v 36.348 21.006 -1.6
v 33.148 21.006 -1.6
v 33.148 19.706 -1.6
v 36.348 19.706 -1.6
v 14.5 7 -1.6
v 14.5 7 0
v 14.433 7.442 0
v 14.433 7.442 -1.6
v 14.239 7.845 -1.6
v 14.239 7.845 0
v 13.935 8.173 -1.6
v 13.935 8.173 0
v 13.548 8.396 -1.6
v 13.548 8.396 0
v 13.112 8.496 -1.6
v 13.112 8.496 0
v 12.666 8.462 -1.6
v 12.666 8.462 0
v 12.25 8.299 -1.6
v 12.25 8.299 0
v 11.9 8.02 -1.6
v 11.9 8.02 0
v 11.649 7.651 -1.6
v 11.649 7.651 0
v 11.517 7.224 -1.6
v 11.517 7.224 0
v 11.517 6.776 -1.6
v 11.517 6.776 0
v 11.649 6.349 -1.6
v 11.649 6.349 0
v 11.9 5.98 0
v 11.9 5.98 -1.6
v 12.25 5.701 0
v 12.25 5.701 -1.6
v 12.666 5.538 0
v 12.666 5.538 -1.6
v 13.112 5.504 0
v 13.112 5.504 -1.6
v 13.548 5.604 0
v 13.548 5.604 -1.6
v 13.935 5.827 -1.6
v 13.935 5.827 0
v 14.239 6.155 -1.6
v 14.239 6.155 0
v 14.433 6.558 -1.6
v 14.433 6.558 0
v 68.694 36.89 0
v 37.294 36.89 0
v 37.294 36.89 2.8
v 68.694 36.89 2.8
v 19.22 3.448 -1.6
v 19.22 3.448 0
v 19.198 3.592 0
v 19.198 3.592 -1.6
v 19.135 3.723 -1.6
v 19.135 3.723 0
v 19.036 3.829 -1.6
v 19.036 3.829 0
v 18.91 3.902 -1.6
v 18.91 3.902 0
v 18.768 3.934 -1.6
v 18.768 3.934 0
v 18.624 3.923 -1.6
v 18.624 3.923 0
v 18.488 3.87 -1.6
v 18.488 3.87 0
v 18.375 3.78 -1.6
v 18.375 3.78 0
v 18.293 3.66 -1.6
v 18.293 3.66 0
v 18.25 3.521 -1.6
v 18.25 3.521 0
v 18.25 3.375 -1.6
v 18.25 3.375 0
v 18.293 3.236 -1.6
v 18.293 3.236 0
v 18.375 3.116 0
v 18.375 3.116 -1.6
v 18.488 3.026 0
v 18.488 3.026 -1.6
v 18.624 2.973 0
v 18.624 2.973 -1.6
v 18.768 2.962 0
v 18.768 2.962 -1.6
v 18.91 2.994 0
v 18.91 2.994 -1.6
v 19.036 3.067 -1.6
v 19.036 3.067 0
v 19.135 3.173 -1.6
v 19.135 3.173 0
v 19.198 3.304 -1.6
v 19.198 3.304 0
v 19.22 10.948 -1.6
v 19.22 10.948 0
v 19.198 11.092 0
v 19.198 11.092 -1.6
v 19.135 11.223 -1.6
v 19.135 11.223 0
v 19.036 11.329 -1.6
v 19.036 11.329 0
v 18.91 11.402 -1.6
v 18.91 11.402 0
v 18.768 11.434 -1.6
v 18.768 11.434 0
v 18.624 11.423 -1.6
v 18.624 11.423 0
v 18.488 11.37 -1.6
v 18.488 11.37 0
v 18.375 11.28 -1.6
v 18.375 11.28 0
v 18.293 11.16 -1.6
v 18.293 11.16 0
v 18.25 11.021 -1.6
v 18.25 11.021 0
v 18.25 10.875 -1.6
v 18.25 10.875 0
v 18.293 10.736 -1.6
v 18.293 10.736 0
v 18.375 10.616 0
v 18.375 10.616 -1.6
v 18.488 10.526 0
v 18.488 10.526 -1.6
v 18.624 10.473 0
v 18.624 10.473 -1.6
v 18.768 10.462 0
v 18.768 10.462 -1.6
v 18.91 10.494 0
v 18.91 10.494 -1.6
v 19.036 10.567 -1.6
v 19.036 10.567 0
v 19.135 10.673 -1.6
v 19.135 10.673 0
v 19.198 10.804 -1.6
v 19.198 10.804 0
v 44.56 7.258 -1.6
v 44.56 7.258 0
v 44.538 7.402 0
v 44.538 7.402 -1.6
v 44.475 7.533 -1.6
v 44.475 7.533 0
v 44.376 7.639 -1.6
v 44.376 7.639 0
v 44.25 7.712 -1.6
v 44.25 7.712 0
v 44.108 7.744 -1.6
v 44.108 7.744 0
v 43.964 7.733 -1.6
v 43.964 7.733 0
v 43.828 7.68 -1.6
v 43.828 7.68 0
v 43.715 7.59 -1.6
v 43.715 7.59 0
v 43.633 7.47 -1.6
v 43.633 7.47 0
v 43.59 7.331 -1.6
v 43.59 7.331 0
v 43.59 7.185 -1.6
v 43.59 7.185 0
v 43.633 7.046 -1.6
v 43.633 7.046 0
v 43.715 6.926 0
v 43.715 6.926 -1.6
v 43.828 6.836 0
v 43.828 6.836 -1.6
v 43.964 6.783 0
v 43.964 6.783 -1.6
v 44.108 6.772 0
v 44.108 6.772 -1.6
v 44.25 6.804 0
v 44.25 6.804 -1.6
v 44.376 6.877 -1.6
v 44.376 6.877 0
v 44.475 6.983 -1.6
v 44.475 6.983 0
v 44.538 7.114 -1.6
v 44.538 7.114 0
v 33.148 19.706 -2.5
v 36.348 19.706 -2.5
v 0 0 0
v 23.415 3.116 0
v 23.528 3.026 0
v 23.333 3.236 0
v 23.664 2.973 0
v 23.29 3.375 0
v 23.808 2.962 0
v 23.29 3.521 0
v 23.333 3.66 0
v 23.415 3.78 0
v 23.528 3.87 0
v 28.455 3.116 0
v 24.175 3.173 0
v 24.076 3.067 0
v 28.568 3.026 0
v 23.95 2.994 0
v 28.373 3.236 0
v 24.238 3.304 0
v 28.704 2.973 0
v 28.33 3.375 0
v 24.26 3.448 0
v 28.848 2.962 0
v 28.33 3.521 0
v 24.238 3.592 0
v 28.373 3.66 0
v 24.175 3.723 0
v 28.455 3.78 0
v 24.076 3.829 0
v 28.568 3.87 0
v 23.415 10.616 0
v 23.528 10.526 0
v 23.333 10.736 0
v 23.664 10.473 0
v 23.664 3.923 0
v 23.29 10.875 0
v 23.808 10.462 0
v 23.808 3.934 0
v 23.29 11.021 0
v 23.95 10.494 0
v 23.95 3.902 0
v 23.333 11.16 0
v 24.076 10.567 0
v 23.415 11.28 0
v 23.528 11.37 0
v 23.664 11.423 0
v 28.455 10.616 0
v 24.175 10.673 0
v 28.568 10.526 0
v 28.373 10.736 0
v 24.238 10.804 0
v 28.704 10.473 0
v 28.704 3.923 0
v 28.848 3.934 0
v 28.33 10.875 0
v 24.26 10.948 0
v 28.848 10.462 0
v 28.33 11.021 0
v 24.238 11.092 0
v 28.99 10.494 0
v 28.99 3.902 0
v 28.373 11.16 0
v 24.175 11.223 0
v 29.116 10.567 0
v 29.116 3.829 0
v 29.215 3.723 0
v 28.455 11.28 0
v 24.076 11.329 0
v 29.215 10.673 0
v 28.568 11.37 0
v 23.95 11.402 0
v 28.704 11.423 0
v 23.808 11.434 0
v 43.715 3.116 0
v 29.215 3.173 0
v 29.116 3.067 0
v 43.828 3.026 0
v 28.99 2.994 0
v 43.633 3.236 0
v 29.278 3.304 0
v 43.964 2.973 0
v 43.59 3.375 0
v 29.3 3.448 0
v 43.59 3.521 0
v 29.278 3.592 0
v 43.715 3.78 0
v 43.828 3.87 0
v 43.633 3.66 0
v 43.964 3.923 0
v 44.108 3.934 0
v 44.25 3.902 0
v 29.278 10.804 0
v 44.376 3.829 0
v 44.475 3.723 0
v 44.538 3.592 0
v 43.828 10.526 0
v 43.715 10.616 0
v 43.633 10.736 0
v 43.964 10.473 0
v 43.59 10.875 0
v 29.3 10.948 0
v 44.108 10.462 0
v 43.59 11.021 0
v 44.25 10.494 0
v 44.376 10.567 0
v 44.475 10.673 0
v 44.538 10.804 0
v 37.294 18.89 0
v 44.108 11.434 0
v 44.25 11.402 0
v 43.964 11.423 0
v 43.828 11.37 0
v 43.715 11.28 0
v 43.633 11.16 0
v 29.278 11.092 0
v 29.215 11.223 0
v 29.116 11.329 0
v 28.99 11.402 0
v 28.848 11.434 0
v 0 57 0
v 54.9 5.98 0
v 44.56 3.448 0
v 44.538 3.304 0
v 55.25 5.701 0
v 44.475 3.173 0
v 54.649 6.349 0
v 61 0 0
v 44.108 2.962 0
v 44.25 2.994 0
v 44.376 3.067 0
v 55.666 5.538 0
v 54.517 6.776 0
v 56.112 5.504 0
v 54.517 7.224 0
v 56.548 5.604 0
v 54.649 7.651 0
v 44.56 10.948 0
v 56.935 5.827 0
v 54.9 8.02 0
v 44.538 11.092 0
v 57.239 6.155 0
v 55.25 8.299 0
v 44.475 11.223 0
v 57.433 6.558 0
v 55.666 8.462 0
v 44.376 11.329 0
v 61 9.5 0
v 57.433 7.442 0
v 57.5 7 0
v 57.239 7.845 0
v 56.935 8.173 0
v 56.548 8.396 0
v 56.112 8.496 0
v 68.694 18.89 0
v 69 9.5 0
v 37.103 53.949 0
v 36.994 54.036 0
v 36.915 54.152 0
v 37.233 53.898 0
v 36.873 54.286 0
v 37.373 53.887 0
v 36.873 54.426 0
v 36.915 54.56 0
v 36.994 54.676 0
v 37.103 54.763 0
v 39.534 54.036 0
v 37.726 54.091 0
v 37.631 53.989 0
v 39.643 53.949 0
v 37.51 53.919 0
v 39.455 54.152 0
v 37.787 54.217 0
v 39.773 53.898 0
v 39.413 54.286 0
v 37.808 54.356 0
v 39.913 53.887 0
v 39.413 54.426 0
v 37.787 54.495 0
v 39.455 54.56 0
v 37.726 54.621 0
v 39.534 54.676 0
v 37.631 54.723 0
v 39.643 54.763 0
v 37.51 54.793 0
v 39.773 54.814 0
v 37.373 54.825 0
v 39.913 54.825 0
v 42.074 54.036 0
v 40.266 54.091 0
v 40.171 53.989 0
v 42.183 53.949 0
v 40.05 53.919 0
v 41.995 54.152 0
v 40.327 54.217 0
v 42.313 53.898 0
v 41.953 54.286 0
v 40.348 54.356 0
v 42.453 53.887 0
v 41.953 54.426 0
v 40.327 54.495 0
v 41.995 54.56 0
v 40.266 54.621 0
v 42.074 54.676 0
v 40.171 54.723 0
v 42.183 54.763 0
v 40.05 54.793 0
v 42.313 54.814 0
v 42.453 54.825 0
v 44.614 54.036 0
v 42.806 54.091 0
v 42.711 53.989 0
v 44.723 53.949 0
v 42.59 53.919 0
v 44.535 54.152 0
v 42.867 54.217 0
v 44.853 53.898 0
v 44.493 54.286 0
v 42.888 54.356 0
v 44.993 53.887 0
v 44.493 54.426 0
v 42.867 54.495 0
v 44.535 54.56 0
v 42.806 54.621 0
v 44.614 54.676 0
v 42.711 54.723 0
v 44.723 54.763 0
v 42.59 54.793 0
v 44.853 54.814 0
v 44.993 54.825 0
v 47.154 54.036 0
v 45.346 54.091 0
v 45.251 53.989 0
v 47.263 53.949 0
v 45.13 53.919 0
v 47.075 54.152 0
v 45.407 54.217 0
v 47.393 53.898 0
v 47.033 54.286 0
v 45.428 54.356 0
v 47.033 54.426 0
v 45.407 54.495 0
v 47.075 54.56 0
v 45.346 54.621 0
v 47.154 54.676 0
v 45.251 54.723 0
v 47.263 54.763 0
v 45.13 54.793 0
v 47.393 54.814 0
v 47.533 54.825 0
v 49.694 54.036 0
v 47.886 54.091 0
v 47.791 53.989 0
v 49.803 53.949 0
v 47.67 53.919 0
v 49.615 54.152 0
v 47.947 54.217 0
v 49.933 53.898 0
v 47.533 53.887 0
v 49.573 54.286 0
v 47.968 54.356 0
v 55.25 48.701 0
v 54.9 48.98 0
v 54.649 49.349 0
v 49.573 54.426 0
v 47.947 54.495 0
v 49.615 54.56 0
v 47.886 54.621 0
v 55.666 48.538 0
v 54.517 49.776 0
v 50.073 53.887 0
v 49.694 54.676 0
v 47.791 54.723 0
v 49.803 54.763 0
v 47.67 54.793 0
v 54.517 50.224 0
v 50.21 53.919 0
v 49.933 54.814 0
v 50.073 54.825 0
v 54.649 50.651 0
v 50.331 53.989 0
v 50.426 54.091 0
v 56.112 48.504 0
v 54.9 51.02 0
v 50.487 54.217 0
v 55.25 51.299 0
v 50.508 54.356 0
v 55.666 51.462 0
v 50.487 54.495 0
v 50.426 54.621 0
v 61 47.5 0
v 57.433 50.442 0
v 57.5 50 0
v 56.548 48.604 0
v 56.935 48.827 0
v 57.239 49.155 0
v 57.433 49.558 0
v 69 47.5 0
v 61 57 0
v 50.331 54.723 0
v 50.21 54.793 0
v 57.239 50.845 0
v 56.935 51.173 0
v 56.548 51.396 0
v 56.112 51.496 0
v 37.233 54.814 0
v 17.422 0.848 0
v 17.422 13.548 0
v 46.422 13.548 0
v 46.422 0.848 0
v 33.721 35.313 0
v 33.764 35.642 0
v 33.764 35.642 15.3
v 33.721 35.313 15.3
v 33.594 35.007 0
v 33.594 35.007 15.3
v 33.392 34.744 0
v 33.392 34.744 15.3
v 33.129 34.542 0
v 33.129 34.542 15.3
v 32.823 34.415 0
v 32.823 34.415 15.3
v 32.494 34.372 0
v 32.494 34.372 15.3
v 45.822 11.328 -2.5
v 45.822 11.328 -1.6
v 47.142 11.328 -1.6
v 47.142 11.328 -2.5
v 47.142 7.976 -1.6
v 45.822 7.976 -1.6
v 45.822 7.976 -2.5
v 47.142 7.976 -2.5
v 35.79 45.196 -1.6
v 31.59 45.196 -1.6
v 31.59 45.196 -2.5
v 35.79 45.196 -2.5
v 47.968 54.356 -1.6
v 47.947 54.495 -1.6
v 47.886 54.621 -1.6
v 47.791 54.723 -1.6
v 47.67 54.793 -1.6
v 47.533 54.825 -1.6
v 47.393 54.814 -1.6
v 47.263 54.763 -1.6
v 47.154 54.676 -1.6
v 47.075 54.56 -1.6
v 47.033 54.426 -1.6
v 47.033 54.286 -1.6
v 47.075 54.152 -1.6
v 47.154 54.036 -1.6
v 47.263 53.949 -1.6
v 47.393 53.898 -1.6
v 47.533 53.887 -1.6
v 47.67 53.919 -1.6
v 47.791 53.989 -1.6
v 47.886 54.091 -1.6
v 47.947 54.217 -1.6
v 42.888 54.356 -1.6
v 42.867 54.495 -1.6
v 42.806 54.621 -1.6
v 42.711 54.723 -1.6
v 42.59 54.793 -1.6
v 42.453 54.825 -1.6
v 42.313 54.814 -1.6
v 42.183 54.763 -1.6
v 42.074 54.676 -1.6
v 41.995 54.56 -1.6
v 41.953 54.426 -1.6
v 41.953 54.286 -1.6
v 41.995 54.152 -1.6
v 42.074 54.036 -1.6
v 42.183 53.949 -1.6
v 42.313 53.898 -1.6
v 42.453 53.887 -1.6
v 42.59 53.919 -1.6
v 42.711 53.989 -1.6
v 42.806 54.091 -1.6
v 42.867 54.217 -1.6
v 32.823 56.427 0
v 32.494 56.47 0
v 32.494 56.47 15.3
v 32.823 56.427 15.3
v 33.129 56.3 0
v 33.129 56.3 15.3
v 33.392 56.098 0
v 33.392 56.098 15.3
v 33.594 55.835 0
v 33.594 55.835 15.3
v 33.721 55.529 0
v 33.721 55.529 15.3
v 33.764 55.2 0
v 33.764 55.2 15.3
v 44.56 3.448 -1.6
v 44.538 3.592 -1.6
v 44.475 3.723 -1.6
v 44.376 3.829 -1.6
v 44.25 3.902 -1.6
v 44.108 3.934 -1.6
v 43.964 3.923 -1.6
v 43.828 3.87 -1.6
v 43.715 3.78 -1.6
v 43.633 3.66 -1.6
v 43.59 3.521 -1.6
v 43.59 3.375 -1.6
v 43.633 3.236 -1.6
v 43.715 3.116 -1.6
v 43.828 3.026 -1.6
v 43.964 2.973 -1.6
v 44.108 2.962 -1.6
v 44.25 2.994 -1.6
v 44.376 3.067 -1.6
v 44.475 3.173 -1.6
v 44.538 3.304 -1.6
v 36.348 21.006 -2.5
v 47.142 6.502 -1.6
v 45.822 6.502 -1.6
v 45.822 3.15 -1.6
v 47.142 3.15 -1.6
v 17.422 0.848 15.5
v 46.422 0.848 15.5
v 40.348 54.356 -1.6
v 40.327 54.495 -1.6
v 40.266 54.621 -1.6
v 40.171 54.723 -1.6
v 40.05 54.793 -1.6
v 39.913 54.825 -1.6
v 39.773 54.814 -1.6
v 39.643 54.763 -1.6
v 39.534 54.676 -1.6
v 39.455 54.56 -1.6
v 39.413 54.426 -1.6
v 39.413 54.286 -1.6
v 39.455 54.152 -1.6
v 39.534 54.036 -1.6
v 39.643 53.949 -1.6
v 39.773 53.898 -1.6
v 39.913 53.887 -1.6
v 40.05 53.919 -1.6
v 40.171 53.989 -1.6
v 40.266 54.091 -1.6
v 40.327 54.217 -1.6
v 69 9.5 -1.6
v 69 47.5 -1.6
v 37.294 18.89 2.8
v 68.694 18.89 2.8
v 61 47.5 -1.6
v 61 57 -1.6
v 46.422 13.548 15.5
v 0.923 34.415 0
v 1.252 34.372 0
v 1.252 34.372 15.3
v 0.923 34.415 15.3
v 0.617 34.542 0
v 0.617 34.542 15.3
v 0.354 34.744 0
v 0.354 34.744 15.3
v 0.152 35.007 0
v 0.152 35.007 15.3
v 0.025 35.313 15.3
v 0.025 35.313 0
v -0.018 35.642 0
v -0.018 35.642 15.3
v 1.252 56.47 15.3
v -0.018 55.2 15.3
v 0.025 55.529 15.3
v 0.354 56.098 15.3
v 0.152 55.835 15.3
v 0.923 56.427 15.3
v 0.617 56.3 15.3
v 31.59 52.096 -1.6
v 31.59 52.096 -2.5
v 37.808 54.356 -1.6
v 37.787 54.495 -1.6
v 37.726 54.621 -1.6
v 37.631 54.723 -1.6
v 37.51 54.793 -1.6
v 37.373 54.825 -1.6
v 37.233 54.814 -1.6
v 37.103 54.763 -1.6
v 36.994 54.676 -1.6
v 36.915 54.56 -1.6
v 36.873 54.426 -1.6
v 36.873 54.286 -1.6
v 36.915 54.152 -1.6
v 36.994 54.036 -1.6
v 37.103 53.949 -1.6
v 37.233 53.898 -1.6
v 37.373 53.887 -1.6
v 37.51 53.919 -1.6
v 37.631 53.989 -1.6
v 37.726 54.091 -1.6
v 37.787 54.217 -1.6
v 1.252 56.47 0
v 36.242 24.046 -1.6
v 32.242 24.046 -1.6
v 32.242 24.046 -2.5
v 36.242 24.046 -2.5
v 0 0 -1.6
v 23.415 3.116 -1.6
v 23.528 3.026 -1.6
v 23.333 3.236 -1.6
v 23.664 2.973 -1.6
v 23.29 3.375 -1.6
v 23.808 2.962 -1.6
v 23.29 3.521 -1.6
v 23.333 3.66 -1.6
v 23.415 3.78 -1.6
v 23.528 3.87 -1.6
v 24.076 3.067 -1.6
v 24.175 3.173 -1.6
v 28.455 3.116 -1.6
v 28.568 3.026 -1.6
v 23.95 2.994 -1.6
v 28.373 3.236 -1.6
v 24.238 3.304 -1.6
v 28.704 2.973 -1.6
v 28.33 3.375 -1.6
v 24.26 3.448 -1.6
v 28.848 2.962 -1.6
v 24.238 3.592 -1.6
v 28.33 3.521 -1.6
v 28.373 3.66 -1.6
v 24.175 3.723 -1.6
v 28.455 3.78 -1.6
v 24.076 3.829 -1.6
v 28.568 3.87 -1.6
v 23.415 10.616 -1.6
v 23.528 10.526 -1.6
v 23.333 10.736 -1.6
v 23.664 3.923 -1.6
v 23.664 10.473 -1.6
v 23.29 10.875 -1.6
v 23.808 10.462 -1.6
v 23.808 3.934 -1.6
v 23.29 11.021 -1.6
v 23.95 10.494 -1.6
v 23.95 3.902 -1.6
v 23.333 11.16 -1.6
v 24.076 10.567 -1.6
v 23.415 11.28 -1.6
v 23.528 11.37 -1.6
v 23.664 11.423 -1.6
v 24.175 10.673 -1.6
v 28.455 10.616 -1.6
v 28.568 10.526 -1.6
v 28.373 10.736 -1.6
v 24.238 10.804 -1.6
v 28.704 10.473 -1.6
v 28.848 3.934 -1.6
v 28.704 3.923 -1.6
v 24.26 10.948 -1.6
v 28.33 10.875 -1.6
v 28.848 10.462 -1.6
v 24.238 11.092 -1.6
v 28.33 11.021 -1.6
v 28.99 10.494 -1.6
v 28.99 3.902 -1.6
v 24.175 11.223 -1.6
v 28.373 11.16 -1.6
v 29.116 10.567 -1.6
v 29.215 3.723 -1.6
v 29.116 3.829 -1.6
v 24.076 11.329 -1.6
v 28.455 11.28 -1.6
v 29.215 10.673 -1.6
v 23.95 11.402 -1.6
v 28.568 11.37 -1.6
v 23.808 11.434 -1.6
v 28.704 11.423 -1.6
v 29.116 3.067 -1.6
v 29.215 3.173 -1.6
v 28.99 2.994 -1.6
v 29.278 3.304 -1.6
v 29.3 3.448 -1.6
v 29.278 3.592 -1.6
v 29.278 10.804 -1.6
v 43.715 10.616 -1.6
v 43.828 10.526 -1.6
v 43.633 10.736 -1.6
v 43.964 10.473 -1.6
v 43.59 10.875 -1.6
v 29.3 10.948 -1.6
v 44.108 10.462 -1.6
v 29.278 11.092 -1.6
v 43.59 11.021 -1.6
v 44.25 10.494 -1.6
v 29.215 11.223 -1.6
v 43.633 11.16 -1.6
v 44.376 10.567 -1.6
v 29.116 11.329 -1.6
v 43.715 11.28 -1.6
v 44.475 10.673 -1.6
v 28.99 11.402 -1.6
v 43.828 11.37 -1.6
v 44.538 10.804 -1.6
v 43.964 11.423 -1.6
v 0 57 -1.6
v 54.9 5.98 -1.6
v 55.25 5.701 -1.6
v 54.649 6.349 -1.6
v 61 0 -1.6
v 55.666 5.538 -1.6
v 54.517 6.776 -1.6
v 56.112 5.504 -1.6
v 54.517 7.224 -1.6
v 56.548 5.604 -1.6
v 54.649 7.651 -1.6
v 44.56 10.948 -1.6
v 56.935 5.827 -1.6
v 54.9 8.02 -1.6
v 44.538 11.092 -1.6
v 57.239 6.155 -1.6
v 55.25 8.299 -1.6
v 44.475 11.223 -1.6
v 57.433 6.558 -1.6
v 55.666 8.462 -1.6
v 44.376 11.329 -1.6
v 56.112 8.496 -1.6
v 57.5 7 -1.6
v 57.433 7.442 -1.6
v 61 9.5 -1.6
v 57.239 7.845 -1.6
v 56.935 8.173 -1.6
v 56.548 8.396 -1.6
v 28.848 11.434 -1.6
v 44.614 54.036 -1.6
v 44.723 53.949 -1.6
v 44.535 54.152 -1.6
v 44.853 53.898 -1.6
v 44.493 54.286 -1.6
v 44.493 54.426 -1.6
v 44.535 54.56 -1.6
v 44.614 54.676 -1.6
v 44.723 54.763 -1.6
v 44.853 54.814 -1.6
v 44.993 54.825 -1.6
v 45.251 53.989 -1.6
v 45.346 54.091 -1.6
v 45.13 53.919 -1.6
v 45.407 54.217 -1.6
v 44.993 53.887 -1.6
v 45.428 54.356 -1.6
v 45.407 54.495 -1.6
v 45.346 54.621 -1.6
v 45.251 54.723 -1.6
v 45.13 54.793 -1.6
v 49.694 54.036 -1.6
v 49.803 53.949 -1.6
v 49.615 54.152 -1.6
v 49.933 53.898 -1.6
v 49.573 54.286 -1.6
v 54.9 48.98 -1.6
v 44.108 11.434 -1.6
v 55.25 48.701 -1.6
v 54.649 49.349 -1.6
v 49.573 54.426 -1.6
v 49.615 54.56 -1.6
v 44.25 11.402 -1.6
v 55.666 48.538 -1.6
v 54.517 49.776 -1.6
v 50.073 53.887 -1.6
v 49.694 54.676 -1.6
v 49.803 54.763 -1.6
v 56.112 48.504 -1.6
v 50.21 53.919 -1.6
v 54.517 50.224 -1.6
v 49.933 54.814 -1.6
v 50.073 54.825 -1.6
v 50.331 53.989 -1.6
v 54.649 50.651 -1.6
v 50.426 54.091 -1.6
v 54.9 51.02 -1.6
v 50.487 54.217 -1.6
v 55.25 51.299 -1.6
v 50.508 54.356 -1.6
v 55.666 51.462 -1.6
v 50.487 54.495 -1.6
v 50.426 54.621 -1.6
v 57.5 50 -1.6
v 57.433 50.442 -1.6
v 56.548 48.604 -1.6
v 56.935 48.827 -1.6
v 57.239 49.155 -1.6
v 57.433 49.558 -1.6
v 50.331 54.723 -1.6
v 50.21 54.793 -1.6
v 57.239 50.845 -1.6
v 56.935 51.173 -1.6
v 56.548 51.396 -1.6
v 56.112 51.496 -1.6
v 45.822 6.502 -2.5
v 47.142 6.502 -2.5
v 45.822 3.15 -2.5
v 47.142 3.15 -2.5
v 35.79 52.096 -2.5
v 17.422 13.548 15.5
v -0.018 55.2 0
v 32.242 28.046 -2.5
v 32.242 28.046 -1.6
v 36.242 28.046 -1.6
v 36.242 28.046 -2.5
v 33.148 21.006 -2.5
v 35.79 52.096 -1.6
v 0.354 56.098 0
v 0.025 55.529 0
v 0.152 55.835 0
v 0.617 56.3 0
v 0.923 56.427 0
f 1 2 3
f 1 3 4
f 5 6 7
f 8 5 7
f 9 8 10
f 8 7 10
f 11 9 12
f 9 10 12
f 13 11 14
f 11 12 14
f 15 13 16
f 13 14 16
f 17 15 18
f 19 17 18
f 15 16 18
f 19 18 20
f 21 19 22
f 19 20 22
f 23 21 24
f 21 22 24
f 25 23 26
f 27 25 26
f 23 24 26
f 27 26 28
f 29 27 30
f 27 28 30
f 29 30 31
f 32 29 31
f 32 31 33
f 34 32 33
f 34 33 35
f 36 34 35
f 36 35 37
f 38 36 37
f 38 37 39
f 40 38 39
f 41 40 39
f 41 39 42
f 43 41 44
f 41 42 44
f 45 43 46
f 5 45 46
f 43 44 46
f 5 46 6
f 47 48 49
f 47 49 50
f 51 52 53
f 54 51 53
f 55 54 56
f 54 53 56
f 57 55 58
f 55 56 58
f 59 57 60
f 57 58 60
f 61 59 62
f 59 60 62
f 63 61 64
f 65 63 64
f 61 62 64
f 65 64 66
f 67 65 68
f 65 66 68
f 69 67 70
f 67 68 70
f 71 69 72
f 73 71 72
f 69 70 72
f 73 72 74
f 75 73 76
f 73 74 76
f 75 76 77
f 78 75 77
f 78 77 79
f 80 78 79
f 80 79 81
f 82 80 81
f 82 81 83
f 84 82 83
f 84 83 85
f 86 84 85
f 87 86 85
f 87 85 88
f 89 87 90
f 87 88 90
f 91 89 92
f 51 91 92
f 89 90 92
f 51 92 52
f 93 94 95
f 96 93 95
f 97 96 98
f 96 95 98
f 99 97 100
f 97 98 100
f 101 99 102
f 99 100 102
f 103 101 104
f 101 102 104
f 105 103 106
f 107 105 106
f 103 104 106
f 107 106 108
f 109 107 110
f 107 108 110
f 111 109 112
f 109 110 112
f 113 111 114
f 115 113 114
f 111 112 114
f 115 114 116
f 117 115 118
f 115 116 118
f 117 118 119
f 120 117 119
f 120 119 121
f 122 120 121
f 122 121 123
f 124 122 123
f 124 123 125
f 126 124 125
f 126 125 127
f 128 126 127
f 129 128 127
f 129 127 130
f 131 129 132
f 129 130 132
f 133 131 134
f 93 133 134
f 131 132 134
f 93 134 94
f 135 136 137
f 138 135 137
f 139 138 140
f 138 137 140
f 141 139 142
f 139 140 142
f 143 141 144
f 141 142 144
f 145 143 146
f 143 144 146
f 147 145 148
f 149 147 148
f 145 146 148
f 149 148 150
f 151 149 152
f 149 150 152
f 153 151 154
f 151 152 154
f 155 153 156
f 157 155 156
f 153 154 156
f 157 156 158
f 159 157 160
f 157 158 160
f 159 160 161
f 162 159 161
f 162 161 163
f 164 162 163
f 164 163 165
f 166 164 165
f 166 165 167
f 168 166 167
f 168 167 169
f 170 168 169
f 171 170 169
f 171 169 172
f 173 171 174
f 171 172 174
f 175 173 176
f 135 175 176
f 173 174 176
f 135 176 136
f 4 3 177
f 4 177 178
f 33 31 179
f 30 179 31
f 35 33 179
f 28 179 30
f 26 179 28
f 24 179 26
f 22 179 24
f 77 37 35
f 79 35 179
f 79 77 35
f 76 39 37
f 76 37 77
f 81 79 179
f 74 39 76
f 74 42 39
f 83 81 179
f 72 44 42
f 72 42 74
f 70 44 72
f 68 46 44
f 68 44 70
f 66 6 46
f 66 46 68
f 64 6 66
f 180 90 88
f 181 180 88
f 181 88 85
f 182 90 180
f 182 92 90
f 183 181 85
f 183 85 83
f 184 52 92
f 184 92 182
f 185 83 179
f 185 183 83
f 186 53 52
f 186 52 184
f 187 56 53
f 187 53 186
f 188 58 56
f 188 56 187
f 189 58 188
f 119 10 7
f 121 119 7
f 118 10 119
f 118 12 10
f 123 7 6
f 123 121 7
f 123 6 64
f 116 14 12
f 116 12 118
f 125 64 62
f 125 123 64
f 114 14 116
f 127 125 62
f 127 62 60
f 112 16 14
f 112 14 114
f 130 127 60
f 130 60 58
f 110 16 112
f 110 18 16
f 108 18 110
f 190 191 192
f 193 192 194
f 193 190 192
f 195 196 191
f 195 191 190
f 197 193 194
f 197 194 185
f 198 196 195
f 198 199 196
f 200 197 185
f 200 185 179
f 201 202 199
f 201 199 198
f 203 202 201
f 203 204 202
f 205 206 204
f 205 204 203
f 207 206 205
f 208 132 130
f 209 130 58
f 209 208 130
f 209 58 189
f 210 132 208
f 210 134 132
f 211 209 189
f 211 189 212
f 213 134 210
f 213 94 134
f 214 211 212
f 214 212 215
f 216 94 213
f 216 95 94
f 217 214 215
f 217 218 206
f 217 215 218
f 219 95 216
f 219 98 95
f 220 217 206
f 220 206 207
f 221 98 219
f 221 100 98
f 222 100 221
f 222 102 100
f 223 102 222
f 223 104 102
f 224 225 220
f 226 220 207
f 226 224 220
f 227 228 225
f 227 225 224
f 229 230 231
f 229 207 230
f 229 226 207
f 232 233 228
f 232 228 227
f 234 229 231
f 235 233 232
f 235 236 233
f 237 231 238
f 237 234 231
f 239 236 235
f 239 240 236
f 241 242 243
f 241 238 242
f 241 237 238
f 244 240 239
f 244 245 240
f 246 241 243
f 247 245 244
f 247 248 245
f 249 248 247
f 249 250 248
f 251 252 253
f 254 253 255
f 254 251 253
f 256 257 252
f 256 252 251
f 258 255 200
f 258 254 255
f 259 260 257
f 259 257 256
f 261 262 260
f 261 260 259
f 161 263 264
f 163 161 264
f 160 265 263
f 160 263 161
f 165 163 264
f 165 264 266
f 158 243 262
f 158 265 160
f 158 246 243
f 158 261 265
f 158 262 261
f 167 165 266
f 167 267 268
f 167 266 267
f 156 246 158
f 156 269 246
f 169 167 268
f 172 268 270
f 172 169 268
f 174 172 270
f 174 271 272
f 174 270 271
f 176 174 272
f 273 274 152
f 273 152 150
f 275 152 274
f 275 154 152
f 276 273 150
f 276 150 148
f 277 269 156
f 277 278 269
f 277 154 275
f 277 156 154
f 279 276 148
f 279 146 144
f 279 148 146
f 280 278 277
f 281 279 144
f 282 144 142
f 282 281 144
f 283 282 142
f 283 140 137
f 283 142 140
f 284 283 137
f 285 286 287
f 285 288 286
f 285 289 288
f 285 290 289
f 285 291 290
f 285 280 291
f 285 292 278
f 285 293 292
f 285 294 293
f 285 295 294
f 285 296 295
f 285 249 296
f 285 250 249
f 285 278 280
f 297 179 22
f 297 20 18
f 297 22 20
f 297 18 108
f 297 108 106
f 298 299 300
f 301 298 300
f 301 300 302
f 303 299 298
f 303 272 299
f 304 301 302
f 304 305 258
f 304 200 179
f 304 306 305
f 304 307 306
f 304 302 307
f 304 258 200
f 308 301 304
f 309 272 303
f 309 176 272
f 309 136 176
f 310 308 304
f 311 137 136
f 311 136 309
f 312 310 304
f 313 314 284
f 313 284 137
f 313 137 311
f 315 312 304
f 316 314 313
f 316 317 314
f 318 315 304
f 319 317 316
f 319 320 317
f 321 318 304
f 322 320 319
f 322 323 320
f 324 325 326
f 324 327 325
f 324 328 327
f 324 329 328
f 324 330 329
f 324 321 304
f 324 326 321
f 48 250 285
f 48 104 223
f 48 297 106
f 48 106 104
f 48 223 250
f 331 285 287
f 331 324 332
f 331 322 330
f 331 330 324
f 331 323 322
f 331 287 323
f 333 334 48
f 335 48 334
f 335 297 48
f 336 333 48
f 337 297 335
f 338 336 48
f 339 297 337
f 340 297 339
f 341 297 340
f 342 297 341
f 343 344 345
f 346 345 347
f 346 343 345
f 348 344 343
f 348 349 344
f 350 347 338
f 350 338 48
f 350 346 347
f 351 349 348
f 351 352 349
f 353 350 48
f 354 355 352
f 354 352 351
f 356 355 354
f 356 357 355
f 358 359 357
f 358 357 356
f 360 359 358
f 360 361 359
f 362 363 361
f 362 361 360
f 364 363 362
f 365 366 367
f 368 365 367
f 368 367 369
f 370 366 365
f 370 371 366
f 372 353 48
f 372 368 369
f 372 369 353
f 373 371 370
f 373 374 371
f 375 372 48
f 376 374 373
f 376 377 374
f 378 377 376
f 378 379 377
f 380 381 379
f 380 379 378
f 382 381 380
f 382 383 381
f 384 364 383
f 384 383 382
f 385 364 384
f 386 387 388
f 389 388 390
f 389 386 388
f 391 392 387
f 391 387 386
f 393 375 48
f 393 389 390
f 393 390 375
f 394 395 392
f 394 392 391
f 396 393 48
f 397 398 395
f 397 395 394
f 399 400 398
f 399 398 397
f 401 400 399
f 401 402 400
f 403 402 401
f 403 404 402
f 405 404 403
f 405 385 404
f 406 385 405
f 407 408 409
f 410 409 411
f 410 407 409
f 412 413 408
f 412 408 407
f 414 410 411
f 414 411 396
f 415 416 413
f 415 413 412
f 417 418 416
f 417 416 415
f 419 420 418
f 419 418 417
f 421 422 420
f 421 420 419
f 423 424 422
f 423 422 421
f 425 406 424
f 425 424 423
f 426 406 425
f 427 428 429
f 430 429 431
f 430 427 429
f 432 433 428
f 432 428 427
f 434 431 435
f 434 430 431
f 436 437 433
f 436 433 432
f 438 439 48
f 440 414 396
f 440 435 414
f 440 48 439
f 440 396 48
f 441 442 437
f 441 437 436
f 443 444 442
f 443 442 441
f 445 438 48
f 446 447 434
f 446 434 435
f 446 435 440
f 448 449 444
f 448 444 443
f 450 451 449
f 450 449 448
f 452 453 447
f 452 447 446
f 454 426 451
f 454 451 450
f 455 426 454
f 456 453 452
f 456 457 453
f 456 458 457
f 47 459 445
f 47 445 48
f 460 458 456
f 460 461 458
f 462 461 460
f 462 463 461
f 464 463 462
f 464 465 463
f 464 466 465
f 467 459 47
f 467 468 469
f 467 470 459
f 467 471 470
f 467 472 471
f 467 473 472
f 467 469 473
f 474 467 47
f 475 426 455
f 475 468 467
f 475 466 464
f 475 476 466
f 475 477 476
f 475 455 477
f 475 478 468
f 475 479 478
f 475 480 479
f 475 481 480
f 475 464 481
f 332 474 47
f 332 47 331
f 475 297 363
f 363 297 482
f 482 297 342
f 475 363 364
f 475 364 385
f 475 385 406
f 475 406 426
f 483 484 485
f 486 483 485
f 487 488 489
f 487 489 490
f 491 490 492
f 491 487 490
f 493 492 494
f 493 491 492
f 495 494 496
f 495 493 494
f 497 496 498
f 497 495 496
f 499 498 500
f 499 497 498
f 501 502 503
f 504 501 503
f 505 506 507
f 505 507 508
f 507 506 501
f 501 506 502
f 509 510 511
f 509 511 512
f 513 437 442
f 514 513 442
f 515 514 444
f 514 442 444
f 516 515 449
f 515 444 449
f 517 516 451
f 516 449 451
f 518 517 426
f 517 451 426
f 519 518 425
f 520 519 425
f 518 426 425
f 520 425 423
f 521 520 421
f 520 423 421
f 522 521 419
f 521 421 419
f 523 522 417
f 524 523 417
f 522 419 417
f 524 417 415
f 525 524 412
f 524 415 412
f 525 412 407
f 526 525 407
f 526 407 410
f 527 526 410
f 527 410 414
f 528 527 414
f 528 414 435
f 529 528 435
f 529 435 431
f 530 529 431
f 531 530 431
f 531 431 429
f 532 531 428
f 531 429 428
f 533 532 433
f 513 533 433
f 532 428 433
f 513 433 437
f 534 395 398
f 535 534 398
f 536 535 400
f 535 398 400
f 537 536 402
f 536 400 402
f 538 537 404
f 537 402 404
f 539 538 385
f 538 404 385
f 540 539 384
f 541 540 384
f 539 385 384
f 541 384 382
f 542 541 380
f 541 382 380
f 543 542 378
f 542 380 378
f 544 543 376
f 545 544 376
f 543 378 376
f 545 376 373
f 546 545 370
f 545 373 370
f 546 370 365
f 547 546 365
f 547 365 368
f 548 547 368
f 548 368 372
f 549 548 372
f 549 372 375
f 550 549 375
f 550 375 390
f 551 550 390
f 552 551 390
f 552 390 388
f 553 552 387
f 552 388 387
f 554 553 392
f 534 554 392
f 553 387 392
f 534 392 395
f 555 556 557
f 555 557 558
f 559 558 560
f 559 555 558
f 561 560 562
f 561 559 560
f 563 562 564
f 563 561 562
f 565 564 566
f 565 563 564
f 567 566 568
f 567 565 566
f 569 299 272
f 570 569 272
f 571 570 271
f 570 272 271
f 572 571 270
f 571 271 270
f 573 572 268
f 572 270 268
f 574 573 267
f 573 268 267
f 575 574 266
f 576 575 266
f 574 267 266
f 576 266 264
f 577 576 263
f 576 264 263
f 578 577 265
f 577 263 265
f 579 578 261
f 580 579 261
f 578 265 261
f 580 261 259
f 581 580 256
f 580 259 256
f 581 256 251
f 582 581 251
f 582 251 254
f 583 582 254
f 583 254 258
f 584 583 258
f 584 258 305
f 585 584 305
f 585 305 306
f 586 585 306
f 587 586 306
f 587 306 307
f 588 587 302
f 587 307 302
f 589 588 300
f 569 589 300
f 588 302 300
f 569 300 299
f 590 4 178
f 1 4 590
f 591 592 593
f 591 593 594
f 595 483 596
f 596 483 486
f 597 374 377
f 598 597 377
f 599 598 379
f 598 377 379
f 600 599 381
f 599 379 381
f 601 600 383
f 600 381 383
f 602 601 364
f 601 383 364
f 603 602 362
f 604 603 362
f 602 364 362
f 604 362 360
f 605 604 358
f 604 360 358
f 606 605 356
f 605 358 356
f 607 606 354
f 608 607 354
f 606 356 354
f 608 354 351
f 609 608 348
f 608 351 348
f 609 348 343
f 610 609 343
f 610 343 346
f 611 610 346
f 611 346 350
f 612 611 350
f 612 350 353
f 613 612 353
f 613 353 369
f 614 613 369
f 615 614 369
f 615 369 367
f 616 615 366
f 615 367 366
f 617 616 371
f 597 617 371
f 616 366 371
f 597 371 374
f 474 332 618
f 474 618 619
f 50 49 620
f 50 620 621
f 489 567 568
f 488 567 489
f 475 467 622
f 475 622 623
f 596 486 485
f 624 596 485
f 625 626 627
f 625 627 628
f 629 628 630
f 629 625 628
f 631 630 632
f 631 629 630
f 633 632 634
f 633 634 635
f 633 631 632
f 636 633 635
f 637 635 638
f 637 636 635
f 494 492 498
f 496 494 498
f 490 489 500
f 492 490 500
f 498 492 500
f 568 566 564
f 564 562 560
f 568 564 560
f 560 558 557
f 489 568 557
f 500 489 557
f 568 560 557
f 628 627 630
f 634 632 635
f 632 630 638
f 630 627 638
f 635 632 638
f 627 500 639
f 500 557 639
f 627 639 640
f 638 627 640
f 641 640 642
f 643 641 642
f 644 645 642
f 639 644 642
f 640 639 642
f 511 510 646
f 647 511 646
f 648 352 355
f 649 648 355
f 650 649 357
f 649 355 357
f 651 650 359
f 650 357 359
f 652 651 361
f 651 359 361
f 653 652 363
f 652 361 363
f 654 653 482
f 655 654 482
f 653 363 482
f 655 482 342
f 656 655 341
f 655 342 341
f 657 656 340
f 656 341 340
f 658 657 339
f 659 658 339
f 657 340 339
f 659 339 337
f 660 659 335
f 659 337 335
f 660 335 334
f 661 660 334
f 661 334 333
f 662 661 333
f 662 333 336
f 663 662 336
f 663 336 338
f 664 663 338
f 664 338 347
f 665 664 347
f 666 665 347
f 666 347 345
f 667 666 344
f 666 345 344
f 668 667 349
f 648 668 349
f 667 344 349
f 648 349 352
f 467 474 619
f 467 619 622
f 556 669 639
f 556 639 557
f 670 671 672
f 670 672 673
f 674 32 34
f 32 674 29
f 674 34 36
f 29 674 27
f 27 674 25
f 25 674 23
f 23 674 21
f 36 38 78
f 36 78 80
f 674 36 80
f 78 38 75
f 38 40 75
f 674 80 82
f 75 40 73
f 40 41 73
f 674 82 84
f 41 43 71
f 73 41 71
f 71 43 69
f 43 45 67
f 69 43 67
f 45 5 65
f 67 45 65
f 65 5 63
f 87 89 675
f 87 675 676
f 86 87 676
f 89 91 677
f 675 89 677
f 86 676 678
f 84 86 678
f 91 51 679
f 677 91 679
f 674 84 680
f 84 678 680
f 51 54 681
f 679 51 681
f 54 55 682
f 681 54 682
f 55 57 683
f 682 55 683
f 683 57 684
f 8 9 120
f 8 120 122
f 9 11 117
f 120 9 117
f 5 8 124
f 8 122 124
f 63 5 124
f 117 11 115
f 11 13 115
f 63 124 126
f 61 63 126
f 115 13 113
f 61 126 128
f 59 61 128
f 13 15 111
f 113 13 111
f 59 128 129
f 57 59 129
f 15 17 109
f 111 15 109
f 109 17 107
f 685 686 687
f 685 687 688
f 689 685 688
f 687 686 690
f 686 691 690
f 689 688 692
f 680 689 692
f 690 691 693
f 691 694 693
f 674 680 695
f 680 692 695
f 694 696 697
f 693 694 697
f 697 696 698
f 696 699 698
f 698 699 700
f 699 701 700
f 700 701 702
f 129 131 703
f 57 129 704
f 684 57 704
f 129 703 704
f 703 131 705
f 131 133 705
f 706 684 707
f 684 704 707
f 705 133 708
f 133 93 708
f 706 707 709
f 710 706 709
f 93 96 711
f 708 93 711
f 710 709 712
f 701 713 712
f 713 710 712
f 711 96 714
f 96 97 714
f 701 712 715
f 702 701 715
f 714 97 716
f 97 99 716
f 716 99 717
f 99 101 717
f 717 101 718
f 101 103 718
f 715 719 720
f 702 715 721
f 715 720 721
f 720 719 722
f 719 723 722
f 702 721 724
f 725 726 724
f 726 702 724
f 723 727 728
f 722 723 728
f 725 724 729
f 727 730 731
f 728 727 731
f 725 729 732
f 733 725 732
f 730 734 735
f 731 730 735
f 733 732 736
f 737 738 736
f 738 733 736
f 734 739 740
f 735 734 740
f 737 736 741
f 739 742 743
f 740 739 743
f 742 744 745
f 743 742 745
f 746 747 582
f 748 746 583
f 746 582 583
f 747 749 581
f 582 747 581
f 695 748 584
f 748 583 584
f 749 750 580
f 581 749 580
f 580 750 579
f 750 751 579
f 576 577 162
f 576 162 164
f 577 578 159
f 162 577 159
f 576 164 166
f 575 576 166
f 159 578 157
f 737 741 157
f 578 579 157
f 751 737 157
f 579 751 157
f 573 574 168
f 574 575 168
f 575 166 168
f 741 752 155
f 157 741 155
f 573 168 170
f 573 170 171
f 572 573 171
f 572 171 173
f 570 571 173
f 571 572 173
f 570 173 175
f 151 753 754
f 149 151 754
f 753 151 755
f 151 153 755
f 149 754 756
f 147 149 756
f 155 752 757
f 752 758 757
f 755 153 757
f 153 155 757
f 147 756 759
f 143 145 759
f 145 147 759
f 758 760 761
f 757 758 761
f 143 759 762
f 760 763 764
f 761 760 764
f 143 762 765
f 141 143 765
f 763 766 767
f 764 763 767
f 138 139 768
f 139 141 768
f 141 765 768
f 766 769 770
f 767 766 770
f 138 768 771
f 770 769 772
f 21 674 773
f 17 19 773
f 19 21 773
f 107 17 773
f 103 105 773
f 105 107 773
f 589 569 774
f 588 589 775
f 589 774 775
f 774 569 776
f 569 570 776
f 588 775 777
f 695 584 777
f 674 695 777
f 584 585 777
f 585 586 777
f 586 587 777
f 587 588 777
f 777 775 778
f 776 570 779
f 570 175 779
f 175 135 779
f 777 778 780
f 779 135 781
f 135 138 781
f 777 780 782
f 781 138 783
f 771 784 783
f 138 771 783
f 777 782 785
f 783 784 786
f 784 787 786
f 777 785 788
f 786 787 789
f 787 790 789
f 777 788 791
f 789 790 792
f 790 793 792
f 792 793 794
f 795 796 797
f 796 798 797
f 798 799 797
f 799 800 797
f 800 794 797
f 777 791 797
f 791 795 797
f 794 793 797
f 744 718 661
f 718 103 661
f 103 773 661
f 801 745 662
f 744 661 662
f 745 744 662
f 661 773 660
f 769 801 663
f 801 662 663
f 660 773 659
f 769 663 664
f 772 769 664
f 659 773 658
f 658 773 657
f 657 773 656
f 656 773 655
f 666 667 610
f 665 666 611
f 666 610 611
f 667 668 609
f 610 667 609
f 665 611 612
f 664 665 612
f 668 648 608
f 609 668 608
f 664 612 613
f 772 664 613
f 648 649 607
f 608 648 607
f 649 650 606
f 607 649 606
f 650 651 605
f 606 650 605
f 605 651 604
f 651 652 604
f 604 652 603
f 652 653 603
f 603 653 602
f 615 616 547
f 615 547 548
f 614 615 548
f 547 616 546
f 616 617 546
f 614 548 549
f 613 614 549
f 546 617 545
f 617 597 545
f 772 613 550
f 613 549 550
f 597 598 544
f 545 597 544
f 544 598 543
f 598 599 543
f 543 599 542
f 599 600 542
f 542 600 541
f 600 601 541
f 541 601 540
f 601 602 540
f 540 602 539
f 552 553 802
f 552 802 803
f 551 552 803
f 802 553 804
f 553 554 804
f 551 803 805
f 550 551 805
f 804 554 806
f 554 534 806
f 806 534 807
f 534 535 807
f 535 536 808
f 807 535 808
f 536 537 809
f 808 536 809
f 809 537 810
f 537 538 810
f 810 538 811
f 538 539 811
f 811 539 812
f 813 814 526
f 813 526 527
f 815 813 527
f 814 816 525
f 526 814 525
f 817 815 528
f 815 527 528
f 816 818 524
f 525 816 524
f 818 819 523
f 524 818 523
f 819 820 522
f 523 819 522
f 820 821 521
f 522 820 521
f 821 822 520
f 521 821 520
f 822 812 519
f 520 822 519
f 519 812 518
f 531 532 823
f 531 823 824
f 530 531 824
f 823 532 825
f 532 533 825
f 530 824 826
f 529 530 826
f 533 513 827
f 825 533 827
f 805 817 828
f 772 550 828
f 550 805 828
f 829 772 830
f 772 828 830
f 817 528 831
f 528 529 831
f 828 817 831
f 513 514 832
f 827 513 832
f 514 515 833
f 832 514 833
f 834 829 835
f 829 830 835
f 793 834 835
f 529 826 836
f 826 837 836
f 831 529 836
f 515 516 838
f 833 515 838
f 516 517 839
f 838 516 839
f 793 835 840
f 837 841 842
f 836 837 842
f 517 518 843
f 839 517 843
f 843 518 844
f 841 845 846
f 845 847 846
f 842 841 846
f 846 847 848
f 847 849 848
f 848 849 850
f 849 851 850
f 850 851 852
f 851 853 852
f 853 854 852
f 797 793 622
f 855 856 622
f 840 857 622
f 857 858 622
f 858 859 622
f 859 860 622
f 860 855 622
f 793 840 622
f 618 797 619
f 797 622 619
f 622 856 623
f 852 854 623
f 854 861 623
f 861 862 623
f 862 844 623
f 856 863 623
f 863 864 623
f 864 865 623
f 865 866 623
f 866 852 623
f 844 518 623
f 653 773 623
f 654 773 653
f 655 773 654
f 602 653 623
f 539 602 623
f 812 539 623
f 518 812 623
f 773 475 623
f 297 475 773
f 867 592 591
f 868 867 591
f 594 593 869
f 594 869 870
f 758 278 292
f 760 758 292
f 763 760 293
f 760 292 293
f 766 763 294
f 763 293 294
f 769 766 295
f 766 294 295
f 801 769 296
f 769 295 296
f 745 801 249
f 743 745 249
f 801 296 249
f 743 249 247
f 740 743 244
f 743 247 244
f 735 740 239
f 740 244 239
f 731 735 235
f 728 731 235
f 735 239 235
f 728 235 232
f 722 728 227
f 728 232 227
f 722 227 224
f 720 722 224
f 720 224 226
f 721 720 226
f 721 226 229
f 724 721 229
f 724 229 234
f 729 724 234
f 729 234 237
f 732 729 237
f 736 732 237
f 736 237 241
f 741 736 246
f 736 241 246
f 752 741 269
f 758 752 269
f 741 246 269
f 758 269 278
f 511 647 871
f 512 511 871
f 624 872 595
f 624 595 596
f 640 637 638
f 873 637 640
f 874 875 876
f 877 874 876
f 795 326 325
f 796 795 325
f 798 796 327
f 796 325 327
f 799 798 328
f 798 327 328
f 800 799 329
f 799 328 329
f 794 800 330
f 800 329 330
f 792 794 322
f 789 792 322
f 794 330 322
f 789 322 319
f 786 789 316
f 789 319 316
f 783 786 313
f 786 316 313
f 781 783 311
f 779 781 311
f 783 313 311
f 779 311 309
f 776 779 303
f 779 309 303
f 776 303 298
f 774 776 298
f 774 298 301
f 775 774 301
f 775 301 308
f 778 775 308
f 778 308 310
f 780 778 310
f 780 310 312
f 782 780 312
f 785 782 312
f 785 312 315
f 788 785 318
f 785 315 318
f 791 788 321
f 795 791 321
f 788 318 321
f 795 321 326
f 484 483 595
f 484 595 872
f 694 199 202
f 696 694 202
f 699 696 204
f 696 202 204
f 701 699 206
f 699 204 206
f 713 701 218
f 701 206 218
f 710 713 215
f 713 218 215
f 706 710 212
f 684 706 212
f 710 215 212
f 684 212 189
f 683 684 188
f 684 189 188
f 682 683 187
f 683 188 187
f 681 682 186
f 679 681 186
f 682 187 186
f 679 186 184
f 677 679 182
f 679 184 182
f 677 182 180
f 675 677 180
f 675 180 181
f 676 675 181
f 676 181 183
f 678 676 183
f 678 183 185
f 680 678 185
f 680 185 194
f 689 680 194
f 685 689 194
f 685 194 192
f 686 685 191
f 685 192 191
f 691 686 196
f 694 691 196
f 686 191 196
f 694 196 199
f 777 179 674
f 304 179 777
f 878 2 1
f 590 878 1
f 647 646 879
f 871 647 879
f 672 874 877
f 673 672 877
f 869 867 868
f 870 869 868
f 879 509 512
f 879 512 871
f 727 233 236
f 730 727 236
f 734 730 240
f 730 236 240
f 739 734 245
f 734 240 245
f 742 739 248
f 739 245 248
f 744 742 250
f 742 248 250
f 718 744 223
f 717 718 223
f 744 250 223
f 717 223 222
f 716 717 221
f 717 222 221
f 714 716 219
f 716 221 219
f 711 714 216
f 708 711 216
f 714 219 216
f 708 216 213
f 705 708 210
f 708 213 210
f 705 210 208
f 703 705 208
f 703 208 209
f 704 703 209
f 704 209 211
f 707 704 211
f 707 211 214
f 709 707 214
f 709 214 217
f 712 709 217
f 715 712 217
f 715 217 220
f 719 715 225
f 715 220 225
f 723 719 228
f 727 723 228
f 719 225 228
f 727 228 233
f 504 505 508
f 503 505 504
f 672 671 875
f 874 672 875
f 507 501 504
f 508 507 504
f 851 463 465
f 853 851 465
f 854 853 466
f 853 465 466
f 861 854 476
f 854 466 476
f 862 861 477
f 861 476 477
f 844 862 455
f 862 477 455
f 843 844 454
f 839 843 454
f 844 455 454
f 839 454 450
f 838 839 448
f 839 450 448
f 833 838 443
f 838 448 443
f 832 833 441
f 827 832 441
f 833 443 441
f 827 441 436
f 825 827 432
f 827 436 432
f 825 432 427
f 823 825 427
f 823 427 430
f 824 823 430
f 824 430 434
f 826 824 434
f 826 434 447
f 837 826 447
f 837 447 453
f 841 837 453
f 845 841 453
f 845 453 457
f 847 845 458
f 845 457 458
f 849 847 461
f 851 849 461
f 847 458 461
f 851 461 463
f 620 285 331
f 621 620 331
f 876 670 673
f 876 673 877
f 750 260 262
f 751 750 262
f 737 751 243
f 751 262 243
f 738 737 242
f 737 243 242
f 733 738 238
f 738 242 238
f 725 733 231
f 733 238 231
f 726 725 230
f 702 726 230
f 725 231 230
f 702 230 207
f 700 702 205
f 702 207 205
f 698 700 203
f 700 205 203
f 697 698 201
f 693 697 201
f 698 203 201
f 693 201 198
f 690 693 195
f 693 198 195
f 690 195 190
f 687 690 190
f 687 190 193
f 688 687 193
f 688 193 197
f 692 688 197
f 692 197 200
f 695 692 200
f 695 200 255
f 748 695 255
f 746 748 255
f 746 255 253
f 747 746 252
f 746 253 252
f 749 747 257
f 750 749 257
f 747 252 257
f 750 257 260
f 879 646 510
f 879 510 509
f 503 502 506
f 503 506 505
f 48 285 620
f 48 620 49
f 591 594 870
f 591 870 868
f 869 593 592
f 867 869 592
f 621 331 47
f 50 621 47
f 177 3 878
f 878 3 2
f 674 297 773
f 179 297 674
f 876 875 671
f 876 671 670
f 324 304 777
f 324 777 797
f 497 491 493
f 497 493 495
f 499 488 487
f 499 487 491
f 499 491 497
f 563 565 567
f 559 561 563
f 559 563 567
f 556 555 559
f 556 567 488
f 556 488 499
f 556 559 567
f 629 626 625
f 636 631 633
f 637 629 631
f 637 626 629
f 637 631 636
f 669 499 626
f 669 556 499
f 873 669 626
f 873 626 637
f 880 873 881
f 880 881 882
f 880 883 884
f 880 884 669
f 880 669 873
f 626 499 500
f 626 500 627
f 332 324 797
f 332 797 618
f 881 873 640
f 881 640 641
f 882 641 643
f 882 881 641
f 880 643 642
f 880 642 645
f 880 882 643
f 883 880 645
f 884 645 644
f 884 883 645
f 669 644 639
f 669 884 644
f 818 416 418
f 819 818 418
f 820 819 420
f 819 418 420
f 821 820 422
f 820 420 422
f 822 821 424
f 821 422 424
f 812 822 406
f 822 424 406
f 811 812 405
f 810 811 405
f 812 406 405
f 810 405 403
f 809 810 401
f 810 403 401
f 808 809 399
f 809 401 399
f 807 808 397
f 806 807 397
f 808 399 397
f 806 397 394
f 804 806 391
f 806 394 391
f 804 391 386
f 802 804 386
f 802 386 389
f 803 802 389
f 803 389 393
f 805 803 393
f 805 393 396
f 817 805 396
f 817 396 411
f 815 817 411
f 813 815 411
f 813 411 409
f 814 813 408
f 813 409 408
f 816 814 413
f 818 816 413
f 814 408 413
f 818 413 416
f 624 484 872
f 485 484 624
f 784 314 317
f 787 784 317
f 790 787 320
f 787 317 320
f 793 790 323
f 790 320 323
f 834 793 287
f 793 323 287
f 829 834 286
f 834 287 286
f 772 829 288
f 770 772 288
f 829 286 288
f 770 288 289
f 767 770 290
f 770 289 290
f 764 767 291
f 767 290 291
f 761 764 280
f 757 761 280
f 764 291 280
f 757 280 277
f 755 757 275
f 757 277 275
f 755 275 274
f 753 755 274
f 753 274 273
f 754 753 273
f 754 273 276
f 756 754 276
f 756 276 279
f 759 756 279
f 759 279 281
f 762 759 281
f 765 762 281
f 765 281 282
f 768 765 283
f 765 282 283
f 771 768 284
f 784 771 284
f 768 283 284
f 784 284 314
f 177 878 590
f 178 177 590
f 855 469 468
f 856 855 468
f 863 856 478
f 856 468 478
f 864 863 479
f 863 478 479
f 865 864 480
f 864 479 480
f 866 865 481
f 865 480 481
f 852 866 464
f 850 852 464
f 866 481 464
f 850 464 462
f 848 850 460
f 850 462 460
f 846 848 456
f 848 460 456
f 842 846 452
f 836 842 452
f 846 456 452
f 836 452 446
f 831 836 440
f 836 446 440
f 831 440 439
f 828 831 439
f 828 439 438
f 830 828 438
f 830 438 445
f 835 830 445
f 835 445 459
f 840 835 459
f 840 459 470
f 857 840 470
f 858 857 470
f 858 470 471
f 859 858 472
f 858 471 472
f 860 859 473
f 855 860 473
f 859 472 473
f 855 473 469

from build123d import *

# Parameters (mm, degrees)
SKETCH_20_R           = 1.5
BOSS_EXTRUDE1_DEPTH   = 1.6
SKETCH_17_R           = 0.4699
SKETCH_17_R_2         = 0.4875
CUT_EXTRUDE1_DEPTH    = 1.6
BOSS_EXTRUDE2_START   = -1.6
SKETCH_52_W           = 4.2
SKETCH_52_H           = 6.9
BOSS_EXTRUDE2_DEPTH   = 0.9
SKETCH_52_W_2         = 1.3208
SKETCH_52_H_2         = 3.3528
BOSS_EXTRUDE2_2_DEPTH = 0.9
BOSS_EXTRUDE2_3_DEPTH = 0.9
SKETCH_52_W_3         = 4
SKETCH_52_H_3         = 4
BOSS_EXTRUDE2_4_DEPTH = 0.9
SKETCH_52_W_4         = 3.2
SKETCH_52_H_4         = 1.3
BOSS_EXTRUDE2_5_DEPTH = 0.9
SKETCH_51_W           = 29
SKETCH_51_H           = 12.7
BOSS_EXTRUDE3_DEPTH   = 15.5
SKETCH_51_3_W         = 31.4
SKETCH_51_3_H         = 18
BOSS_EXTRUDE4_DEPTH   = 2.8
BOSS_EXTRUDE5_DEPTH   = 15.3


with BuildPart() as part:
    # Sketch 20 → Boss-Extrude1 (new body)
    with BuildSketch(Plane.XY):
        Polygon((0, 0), (61, 0), (61, 9.5), (69, 9.5), (69, 47.5), (61, 47.5), (61, 57), (0, 57), align=None)
        with Locations((56, 50)):
            Circle(SKETCH_20_R, mode=Mode.SUBTRACT)
        with Locations((56, 7)):
            Circle(SKETCH_20_R, mode=Mode.SUBTRACT)
        with Locations((13, 7)):
            Circle(SKETCH_20_R, mode=Mode.SUBTRACT)
    extrude(amount=-BOSS_EXTRUDE1_DEPTH)

    # Sketch 17 → Cut-Extrude1 (cut)
    with BuildSketch(Plane.XY):
        with Locations((50.038, 54.356)):
            Circle(SKETCH_17_R)
        with Locations((47.498, 54.356)):
            Circle(SKETCH_17_R)
        with Locations((44.958, 54.356)):
            Circle(SKETCH_17_R)
        with Locations((42.418, 54.356)):
            Circle(SKETCH_17_R)
        with Locations((39.878, 54.356)):
            Circle(SKETCH_17_R)
        with Locations((37.338, 54.356)):
            Circle(SKETCH_17_R)
        with Locations((23.772, 3.448)):
            Circle(SKETCH_17_R_2)
        with Locations((28.812, 3.448)):
            Circle(SKETCH_17_R_2)
        with Locations((18.732, 3.448)):
            Circle(SKETCH_17_R_2)
        with Locations((23.772, 10.948)):
            Circle(SKETCH_17_R_2)
        with Locations((28.812, 10.948)):
            Circle(SKETCH_17_R_2)
        with Locations((18.732, 10.948)):
            Circle(SKETCH_17_R_2)
        with Locations((44.072, 10.948)):
            Circle(SKETCH_17_R_2)
        with Locations((44.072, 3.448)):
            Circle(SKETCH_17_R_2)
        with Locations((44.072, 7.258)):
            Circle(SKETCH_17_R_2)
    extrude(amount=-CUT_EXTRUDE1_DEPTH, mode=Mode.SUBTRACT)

    # 51<3> → Boss-Extrude4 (add)
    with BuildSketch(Plane.XY):
        with Locations((52.994, 27.89)):
            Rectangle(SKETCH_51_3_W, SKETCH_51_3_H)
    extrude(amount=BOSS_EXTRUDE4_DEPTH)


with BuildPart() as body_2:
    # Sketch 52 → Boss-Extrude2 (new body)
    with BuildSketch(Plane.XY.offset(BOSS_EXTRUDE2_START)):
        with Locations((33.69, 48.646)):
            Rectangle(SKETCH_52_W, SKETCH_52_H)
    extrude(amount=-BOSS_EXTRUDE2_DEPTH)


with BuildPart() as body_3:
    # Sketch 52 → Boss-Extrude2 2 (new body)
    with BuildSketch(Plane.XY.offset(BOSS_EXTRUDE2_START)):
        with Locations((46.482, 9.652)):
            Rectangle(SKETCH_52_W_2, SKETCH_52_H_2)
    extrude(amount=-BOSS_EXTRUDE2_2_DEPTH)


with BuildPart() as body_4:
    # Sketch 52 → Boss-Extrude2 3 (new body)
    with BuildSketch(Plane.XY.offset(BOSS_EXTRUDE2_START)):
        with Locations((46.482, 4.826)):
            Rectangle(SKETCH_52_W_2, SKETCH_52_H_2)
    extrude(amount=-BOSS_EXTRUDE2_3_DEPTH)


with BuildPart() as body_5:
    # Sketch 52 → Boss-Extrude2 4 (new body)
    with BuildSketch(Plane.XY.offset(BOSS_EXTRUDE2_START)):
        with Locations((34.242, 26.046)):
            Rectangle(SKETCH_52_W_3, SKETCH_52_H_3)
    extrude(amount=-BOSS_EXTRUDE2_4_DEPTH)


with BuildPart() as body_6:
    # Sketch 52 → Boss-Extrude2 5 (new body)
    with BuildSketch(Plane.XY.offset(BOSS_EXTRUDE2_START)):
        with Locations((34.748, 20.356)):
            Rectangle(SKETCH_52_W_4, SKETCH_52_H_4)
    extrude(amount=-BOSS_EXTRUDE2_5_DEPTH)


with BuildPart() as body_7:
    # Sketch 51 → Boss-Extrude3 (new body)
    with BuildSketch(Plane.XY):
        with Locations((31.922, 7.198)):
            Rectangle(SKETCH_51_W, SKETCH_51_H)
    extrude(amount=BOSS_EXTRUDE3_DEPTH)


with BuildPart() as body_8:
    # Sketch 21 → Boss-Extrude5 (new body)
    with BuildSketch(Plane.XY):
        with BuildLine():
            Line((1.252, 56.47), (32.494, 56.47))
            ThreePointArc((32.494, 56.47), (33.392017, 56.098017), (33.764, 55.2))
            Line((33.764, 55.2), (33.764, 35.642))
            ThreePointArc((33.764, 35.642), (33.392017, 34.743983), (32.494, 34.372))
            Line((32.494, 34.372), (1.252, 34.372))
            ThreePointArc((1.252, 34.372), (0.353983, 34.743983), (-0.018, 35.642))
            Line((-0.018, 35.642), (-0.018, 55.2))
            ThreePointArc((-0.018, 55.2), (0.353983, 56.098017), (1.252, 56.47))
        make_face()
    extrude(amount=BOSS_EXTRUDE5_DEPTH)


solid = Compound([part.part, body_2.part, body_3.part, body_4.part, body_5.part, body_6.part, body_7.part, body_8.part])
